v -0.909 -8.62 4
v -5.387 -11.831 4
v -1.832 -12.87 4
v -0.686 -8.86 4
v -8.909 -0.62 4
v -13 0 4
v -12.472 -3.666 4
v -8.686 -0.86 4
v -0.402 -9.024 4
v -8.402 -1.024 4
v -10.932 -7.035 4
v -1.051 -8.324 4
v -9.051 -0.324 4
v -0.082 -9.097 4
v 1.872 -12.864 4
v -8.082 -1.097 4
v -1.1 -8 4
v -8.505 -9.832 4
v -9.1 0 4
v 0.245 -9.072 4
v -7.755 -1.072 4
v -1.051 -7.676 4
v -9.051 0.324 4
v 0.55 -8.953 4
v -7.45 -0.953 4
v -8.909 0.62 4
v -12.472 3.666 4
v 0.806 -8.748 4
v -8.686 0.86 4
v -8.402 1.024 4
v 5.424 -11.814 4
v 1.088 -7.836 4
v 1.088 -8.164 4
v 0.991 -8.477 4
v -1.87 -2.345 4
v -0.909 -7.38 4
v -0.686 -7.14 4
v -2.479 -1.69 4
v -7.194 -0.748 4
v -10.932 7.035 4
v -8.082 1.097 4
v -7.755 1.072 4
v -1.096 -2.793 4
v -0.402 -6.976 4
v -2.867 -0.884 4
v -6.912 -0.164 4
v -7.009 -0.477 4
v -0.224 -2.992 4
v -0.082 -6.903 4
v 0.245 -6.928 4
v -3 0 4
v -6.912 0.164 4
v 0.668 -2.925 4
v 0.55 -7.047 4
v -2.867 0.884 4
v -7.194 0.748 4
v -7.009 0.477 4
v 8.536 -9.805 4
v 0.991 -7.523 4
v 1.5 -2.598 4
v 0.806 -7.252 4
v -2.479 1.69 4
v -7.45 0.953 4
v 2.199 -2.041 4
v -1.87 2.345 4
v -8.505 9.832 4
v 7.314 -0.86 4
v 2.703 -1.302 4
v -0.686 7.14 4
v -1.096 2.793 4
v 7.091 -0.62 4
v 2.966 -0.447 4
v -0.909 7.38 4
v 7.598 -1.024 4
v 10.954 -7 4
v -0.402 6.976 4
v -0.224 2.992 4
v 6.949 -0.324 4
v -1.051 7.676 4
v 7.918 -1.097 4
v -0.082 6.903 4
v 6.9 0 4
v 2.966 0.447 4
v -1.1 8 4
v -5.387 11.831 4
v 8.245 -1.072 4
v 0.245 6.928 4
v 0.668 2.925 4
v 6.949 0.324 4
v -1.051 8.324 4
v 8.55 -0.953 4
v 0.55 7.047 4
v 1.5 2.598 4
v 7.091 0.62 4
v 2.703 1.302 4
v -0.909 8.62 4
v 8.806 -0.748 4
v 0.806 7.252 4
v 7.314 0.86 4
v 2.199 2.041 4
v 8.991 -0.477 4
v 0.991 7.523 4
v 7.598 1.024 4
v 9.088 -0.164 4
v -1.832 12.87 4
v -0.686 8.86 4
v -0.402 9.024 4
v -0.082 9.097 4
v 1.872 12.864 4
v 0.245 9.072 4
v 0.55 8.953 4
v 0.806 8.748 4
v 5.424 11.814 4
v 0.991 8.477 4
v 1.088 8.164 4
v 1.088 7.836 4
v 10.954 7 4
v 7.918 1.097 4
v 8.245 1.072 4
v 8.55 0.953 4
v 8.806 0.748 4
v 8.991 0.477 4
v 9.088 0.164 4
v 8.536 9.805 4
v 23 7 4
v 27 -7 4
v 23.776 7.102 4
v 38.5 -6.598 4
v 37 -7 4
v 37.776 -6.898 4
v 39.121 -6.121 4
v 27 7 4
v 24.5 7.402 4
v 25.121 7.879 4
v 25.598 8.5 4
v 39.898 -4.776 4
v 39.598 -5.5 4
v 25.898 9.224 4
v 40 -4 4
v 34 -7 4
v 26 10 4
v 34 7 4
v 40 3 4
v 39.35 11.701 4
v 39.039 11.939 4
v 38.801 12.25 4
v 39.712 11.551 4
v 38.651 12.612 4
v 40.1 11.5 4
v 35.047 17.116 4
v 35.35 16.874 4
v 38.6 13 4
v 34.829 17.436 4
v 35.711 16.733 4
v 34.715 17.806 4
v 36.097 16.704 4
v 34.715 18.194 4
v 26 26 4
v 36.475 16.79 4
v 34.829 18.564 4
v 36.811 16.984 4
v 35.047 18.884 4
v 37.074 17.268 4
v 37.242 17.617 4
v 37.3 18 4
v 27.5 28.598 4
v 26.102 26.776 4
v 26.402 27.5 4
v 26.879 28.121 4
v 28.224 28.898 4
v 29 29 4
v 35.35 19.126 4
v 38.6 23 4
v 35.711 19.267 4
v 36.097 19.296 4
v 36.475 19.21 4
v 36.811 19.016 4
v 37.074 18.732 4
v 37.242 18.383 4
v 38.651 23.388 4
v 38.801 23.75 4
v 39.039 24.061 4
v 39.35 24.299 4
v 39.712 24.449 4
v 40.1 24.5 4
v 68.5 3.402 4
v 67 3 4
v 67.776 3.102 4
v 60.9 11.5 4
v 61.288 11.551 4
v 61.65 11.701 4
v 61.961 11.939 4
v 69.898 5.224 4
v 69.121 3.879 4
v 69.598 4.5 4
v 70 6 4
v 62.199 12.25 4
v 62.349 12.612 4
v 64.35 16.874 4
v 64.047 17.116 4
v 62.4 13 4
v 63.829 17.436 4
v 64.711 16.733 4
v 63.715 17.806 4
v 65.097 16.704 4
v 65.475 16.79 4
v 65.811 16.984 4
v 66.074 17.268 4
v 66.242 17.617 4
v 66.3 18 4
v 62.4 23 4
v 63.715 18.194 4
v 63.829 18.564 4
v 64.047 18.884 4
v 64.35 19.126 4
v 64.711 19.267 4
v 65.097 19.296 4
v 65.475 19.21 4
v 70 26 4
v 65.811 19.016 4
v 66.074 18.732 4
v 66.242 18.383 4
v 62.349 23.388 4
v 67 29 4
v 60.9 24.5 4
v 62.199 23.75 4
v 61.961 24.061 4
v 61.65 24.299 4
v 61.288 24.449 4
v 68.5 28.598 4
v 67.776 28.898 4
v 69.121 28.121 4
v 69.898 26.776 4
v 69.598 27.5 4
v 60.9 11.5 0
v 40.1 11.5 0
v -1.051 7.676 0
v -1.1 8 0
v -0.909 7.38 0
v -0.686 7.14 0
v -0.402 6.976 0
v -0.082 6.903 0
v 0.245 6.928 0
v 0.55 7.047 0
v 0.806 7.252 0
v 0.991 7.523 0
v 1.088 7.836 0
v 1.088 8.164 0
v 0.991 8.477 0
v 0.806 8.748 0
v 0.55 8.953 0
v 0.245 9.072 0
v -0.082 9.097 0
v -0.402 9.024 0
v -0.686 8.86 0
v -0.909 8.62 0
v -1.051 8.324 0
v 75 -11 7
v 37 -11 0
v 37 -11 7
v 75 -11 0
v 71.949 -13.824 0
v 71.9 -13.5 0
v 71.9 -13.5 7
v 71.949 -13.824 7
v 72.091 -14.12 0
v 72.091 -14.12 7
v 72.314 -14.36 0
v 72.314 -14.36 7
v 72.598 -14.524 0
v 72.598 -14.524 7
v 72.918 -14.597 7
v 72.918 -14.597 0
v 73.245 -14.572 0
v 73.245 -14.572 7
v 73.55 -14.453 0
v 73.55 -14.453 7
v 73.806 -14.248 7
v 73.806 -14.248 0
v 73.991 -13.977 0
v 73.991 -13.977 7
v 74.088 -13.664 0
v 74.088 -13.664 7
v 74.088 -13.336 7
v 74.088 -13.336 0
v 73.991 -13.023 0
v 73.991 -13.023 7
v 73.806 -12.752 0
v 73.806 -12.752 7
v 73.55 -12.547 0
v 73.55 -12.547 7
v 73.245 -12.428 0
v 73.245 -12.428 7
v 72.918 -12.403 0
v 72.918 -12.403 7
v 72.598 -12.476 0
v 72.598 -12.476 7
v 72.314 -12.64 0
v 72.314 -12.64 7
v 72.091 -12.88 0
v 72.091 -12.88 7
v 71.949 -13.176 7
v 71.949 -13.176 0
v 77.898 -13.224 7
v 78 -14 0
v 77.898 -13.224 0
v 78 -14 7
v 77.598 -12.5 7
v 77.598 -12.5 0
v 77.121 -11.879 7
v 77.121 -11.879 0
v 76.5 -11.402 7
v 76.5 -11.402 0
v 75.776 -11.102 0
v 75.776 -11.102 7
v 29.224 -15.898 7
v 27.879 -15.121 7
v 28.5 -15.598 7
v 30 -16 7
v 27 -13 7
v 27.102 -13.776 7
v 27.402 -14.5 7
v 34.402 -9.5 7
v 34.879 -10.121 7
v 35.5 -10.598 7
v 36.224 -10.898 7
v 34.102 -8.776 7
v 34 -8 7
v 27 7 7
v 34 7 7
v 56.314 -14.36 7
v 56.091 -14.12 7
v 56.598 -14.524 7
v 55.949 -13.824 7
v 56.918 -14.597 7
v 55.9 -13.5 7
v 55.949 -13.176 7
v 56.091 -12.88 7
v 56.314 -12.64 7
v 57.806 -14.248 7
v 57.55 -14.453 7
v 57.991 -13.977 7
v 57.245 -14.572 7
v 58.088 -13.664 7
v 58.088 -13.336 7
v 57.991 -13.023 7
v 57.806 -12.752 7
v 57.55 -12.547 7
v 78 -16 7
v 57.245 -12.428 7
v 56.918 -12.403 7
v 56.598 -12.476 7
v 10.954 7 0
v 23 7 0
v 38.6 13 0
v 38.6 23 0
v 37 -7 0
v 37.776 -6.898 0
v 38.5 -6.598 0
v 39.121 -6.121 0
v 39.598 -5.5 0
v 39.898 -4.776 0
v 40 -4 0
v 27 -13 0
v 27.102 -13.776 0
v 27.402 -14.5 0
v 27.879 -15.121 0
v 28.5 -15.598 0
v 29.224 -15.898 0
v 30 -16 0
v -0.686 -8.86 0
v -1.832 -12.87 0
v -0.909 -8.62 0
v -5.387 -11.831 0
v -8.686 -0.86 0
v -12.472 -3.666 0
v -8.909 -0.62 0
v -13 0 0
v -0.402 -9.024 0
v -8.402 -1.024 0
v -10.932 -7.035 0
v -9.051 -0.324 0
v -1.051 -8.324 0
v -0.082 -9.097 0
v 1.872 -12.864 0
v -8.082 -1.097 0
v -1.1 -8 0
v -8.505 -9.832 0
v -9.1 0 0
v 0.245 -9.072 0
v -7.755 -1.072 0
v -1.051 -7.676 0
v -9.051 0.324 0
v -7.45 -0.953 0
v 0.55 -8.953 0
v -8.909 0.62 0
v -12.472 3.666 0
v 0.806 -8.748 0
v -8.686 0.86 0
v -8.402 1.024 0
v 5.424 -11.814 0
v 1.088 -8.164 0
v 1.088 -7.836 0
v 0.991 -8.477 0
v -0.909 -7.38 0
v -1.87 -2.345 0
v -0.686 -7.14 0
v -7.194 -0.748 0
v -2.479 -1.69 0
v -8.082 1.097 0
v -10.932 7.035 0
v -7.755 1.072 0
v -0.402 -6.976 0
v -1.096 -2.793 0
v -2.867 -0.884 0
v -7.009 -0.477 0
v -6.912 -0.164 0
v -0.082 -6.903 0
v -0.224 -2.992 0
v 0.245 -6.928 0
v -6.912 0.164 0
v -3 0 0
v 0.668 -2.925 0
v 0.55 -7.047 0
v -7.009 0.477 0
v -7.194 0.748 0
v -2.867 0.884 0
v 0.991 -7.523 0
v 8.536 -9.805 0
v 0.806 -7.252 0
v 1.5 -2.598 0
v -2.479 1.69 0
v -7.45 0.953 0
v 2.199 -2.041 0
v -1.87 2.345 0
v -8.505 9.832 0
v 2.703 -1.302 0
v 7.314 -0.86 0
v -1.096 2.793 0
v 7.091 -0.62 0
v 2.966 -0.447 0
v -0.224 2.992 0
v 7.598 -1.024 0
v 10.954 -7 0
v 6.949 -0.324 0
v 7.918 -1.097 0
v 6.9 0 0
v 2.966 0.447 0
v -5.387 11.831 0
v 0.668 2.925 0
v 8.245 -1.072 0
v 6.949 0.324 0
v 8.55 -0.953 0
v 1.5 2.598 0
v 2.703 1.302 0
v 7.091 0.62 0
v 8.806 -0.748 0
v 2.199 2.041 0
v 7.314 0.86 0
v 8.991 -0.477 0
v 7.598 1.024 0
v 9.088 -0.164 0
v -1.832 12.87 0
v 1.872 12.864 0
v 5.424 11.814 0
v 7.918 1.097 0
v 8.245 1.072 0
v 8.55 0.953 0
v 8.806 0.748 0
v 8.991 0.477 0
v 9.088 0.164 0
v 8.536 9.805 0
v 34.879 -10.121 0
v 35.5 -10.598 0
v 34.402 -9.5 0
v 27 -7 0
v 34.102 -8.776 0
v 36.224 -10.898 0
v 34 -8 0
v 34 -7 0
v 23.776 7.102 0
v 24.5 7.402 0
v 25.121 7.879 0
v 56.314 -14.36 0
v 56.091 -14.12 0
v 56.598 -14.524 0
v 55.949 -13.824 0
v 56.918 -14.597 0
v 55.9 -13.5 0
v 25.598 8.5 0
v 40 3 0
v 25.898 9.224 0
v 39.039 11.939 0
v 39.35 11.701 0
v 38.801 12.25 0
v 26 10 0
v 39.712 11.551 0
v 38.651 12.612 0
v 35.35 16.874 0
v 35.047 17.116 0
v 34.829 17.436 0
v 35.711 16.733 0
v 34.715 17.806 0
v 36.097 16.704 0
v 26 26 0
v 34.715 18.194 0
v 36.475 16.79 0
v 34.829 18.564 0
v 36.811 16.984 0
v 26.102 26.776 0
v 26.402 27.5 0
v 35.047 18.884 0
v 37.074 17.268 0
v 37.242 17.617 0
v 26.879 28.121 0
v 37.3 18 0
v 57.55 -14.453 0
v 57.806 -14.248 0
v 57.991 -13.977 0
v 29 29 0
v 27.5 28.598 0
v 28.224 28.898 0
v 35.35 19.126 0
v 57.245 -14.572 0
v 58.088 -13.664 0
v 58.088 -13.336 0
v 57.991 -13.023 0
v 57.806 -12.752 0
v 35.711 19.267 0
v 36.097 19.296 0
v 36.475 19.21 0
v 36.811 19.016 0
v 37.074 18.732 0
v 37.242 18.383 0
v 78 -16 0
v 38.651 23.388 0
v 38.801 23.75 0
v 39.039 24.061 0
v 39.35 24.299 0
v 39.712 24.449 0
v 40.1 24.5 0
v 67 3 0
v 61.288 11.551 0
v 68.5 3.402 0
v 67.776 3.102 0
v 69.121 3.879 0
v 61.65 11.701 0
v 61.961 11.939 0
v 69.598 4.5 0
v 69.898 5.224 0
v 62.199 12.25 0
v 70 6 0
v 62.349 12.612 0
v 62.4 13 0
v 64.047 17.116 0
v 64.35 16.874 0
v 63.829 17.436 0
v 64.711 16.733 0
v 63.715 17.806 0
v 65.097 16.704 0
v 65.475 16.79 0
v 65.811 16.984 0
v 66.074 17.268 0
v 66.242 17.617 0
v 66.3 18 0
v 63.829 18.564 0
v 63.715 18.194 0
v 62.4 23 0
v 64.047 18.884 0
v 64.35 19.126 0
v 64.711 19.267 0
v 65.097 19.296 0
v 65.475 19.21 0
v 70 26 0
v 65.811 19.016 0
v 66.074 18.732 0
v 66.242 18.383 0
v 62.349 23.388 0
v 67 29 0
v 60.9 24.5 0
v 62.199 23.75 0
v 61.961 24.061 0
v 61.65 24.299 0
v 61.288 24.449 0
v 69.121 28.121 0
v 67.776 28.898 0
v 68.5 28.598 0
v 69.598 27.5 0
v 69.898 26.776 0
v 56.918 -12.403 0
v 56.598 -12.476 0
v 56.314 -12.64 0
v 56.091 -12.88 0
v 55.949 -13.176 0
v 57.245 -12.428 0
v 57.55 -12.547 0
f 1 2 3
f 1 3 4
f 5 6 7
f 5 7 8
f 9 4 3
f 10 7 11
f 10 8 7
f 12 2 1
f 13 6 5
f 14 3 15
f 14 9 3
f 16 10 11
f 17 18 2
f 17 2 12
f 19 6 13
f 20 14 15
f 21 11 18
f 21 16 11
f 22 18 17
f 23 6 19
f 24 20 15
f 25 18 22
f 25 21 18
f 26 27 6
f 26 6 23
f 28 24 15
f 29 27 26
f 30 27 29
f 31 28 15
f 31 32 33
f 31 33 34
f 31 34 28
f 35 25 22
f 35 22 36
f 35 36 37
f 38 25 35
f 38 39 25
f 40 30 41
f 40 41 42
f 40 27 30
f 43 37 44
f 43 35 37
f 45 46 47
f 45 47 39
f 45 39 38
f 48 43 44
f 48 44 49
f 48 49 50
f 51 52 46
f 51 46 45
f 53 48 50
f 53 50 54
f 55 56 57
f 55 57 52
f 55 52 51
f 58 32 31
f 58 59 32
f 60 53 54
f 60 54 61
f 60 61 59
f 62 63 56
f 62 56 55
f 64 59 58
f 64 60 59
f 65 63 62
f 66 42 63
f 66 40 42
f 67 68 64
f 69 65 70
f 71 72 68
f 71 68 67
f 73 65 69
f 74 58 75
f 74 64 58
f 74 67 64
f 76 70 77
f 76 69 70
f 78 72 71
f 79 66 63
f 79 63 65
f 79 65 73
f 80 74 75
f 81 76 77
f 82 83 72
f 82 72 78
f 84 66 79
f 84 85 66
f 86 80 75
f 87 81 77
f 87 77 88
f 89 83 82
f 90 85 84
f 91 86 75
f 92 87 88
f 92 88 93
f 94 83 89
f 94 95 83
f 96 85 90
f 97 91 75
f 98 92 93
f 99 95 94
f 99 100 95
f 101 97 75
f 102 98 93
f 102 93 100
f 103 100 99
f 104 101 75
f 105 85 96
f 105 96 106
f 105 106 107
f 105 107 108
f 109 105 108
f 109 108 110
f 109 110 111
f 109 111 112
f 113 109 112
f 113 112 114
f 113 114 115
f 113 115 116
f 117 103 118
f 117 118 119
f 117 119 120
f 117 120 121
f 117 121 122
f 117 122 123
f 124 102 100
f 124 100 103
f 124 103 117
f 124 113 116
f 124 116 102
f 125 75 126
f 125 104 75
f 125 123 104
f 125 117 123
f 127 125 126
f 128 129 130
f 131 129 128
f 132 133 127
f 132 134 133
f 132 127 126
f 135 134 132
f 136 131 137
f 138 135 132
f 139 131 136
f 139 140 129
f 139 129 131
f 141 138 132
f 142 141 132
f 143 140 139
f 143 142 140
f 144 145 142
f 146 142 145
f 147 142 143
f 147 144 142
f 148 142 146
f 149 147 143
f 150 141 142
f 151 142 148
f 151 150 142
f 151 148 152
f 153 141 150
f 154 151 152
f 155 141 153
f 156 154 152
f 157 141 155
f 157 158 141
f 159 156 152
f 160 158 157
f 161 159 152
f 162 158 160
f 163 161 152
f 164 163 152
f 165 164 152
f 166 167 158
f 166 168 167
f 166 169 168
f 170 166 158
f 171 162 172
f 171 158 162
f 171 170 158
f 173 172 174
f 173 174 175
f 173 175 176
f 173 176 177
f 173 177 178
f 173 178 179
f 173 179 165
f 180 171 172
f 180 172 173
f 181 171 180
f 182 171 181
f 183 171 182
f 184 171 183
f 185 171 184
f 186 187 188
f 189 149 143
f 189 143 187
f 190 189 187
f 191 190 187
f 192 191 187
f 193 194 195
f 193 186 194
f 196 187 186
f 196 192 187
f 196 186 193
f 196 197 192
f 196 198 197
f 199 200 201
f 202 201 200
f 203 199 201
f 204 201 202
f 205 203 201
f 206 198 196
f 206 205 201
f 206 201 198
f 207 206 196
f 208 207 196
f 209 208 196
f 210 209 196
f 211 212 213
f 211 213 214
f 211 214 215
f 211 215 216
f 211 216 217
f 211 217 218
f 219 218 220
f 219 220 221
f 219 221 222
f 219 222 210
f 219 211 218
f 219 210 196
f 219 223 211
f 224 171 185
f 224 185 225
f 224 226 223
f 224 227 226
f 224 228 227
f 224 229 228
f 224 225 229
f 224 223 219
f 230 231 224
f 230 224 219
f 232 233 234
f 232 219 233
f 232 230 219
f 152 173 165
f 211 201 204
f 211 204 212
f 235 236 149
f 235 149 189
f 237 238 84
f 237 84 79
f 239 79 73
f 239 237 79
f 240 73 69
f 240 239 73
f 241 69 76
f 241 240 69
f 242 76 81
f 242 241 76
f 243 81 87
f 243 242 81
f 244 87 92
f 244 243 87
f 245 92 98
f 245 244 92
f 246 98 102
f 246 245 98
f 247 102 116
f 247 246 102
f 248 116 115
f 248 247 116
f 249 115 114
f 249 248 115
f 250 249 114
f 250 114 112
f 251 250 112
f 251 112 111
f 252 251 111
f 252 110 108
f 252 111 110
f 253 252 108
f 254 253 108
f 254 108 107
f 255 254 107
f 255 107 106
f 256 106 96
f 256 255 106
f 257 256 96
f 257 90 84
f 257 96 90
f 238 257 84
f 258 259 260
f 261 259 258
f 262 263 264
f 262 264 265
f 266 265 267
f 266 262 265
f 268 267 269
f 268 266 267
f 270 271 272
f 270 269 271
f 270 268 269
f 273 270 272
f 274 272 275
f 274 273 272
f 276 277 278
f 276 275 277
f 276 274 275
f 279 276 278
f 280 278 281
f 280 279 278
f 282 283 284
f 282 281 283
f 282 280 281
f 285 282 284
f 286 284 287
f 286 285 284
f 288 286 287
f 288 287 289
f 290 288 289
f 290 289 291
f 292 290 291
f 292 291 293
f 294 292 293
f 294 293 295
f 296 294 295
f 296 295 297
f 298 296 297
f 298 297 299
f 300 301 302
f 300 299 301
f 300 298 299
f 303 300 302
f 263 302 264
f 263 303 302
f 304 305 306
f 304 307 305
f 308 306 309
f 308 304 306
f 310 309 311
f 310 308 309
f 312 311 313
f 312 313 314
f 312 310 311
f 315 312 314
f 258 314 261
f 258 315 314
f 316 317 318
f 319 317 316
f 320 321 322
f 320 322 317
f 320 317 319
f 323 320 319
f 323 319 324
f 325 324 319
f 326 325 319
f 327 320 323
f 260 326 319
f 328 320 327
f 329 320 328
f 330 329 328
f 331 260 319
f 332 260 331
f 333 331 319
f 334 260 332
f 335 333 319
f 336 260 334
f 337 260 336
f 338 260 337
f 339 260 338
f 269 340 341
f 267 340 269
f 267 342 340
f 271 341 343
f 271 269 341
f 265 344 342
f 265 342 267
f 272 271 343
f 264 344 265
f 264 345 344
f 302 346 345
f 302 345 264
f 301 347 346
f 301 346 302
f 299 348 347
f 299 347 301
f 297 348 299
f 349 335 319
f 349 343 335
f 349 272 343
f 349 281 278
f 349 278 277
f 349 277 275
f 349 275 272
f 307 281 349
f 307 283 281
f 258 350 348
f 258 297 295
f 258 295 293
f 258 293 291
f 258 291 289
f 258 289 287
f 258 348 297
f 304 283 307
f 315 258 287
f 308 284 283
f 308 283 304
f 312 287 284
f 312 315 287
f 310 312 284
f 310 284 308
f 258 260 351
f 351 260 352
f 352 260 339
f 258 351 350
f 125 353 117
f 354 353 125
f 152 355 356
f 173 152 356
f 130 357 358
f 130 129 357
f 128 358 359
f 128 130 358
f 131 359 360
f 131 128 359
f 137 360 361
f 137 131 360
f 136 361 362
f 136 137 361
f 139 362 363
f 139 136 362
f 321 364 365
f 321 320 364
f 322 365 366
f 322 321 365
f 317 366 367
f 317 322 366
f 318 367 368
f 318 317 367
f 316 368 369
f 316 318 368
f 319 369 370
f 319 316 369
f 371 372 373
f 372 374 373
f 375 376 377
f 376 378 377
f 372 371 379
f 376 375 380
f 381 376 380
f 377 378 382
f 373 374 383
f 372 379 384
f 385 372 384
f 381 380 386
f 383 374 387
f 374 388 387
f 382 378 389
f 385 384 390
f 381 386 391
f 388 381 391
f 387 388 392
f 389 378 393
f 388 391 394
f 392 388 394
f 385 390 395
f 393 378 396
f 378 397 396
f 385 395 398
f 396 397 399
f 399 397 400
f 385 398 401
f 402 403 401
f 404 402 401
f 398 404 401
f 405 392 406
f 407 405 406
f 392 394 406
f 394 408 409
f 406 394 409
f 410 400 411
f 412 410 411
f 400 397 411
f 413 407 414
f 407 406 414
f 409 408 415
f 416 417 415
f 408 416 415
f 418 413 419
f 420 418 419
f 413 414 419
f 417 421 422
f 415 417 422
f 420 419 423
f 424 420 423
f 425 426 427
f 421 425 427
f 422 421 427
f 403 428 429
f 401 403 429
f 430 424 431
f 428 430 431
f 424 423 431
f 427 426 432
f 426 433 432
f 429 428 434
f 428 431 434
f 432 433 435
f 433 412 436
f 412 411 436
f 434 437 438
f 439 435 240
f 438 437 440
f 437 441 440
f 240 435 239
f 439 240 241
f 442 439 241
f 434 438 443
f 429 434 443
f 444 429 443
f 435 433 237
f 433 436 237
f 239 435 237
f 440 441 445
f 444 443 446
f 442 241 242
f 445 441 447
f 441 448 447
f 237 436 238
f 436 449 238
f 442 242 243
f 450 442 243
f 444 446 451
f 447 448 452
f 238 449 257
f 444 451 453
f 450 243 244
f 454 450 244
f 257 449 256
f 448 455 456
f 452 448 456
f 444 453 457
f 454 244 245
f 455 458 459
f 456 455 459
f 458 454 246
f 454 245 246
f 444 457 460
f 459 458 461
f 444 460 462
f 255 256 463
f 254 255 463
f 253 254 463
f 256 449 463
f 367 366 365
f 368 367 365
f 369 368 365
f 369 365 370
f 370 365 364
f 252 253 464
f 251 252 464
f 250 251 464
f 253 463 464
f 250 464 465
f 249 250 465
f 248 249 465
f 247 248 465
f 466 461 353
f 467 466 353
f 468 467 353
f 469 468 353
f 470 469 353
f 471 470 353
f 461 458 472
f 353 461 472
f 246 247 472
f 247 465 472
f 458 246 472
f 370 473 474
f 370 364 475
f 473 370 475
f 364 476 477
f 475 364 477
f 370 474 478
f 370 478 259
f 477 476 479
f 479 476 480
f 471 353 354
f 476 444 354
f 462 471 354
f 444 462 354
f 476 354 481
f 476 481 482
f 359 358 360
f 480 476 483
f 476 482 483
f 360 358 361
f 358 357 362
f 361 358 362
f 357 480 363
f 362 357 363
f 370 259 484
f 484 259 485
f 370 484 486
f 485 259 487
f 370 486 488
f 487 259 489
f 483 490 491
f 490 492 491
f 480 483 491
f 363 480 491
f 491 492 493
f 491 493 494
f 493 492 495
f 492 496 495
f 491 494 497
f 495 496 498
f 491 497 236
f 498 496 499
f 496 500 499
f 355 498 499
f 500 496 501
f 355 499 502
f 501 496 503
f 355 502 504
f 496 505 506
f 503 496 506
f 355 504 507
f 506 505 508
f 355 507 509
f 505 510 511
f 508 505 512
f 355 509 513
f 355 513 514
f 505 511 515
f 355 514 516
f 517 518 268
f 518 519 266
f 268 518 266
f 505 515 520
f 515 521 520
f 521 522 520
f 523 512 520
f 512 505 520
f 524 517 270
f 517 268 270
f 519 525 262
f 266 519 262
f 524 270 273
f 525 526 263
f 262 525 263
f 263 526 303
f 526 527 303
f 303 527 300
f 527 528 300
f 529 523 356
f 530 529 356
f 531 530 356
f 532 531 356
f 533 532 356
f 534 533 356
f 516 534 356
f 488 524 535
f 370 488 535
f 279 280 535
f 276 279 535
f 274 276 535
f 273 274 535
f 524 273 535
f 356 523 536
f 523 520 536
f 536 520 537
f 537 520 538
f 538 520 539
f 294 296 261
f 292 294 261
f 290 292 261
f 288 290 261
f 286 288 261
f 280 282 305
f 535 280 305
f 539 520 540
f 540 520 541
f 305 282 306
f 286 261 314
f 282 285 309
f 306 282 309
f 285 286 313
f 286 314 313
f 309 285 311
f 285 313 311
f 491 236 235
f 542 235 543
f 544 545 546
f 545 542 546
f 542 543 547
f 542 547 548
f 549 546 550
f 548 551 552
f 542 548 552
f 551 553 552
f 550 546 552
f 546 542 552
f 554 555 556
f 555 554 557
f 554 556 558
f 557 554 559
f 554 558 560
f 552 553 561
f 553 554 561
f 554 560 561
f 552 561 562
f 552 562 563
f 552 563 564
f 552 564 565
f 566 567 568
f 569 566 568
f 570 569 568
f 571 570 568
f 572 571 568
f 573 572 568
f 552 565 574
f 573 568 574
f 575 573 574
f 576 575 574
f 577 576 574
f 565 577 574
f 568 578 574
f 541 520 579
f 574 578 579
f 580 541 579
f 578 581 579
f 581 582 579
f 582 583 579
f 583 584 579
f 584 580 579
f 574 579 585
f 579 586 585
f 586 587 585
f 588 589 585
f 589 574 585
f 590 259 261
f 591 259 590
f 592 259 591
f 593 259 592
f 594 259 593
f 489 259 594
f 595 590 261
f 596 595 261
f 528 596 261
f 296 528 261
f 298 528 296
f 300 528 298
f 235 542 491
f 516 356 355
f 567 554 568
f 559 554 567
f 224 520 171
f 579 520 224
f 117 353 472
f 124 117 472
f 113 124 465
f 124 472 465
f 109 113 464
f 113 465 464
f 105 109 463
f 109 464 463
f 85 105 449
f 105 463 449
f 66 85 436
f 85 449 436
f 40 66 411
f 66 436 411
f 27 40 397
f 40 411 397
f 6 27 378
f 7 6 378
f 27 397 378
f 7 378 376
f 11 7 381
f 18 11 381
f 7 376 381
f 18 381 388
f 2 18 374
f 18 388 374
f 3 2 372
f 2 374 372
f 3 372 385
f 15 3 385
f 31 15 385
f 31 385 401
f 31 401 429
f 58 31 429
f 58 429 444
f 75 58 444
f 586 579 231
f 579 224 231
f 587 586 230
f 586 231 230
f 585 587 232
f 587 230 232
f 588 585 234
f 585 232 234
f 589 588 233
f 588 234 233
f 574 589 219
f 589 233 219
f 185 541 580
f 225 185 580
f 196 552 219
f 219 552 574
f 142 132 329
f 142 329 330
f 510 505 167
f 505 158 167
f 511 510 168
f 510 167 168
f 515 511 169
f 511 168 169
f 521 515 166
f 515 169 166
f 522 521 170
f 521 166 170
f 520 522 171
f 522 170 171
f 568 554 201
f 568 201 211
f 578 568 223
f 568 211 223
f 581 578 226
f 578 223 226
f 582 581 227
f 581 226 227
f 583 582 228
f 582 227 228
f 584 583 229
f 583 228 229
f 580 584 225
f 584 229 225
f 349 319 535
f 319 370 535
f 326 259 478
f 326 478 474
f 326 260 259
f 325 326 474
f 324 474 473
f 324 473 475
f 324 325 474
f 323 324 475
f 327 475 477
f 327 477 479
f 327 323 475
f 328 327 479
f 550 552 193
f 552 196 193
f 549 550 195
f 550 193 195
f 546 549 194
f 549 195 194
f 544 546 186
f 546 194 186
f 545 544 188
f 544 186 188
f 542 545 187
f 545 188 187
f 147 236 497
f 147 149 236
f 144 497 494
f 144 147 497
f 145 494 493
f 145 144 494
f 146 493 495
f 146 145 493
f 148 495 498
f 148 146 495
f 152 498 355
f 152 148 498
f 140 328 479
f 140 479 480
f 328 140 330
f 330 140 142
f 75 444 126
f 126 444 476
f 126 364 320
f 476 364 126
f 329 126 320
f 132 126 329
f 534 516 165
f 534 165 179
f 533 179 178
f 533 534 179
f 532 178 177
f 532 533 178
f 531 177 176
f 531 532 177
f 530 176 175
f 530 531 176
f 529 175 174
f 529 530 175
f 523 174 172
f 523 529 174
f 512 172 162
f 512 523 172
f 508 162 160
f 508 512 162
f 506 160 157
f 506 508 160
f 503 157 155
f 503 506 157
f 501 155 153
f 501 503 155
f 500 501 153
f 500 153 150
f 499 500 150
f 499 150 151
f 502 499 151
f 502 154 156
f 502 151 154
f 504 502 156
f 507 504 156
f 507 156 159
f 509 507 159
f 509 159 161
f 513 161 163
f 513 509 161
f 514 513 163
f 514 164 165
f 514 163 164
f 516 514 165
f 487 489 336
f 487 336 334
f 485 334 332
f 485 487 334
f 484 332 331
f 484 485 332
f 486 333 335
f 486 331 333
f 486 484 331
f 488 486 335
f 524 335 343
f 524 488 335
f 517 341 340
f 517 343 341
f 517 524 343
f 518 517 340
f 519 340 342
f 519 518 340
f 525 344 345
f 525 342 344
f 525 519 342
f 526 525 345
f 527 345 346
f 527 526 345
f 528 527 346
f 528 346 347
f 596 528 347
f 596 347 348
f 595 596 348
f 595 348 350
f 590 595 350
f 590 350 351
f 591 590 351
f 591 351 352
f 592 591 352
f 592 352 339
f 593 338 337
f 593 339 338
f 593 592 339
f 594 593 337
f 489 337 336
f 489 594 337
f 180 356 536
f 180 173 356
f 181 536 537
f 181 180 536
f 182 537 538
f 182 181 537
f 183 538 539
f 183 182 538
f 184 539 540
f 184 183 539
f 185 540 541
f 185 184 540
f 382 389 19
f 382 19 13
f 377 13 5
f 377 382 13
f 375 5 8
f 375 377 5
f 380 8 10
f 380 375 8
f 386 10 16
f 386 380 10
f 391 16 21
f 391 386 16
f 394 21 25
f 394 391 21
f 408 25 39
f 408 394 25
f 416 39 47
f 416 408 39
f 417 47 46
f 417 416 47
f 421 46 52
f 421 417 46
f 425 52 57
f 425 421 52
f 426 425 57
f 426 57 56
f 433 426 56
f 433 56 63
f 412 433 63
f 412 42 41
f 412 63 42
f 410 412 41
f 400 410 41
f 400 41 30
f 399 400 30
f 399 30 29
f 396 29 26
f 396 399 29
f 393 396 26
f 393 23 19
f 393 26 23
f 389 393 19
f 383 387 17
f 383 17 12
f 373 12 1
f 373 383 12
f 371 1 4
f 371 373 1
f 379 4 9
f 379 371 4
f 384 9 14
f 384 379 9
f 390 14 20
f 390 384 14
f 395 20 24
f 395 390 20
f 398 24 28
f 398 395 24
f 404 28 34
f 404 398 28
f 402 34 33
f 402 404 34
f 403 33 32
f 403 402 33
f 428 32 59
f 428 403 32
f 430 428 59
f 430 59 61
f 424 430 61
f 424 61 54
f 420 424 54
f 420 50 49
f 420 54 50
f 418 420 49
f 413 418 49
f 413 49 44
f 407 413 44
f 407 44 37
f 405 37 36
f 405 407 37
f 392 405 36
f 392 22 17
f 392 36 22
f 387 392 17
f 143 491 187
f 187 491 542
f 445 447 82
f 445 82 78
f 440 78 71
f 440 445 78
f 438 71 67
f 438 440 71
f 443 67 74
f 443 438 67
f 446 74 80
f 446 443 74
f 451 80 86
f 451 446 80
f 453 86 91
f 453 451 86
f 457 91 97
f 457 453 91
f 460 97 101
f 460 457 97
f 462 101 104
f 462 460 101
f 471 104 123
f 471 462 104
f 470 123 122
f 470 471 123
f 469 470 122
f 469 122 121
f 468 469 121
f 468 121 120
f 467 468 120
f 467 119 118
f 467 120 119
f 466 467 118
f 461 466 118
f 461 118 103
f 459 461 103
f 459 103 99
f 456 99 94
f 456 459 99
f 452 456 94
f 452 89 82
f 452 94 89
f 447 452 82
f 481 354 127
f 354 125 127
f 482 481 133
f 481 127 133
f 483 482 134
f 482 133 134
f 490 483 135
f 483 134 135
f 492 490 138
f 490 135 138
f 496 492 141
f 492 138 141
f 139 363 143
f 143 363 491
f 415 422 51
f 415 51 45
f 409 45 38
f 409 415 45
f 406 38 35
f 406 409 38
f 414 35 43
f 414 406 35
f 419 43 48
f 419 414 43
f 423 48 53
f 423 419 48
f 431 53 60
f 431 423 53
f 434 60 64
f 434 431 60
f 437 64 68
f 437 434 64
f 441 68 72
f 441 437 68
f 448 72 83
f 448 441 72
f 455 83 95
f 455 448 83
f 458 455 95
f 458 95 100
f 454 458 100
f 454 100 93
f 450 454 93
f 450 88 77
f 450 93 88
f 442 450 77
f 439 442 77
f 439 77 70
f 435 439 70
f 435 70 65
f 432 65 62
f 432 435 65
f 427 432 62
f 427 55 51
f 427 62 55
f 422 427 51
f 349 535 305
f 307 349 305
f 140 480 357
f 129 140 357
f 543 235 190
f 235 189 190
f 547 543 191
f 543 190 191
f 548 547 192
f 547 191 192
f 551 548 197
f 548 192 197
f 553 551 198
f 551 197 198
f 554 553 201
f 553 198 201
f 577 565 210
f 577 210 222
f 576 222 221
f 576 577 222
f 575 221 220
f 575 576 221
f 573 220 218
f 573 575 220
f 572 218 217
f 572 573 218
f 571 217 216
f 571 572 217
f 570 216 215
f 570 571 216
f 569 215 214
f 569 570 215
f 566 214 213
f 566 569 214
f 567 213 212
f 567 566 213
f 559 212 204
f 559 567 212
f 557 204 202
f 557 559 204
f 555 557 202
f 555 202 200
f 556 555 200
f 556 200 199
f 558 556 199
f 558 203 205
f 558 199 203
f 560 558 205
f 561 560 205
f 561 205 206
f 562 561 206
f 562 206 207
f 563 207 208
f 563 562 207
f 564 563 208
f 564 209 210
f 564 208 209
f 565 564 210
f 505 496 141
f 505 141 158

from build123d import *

# Parameters (mm, degrees)
ELBOW_HORN_FLANGE_PROFILE_R          = 13
ELBOW_HORN_FLANGE_DEPTH              = 4
FOREARM_WEB_PROFILE_W                = 40
FOREARM_WEB_PROFILE_H                = 14
FOREARM_WEB_DEPTH                    = 4
GRIPPER_SERVO_MOUNT_PROFILE_W        = 44
GRIPPER_SERVO_MOUNT_PROFILE_H        = 26
GRIPPER_SERVO_MOUNT_DEPTH            = 4
GRIP_SG90_BODY_CLEARANCE_START       = -5
GRIP_SG90_BODY_CLEARANCE_PROFILE_W   = 23.8
GRIP_SG90_BODY_CLEARANCE_PROFILE_H   = 13
GRIP_SG90_BODY_CLEARANCE_DEPTH       = 81.874897035
GRIP_SERVO_TAB_FASTENERS_START       = -50
GRIP_SERVO_TAB_FASTENERS_PROFILE_R   = 1.3
GRIP_SERVO_TAB_FASTENERS_DEPTH       = 126.874897035
FIXED_FINGER_SPINE_PROFILE_W         = 48
FIXED_FINGER_SPINE_PROFILE_H         = 5
FIXED_FINGER_SPINE_DEPTH             = 7
FIXED_FINGER_ROOT_PROFILE_W          = 7
FIXED_FINGER_ROOT_PROFILE_H          = 23
FIXED_FINGER_ROOT_DEPTH              = 7
ELBOW_CENTER_SCREW_ACCESS_START      = -50
ELBOW_CENTER_SCREW_ACCESS_PROFILE_R  = 3
ELBOW_CENTER_SCREW_ACCESS_DEPTH      = 134.510478384
ELBOW_HORN_FASTENERS_START           = -50
ELBOW_HORN_FASTENERS_PROFILE_R       = 1.1
ELBOW_HORN_FASTENERS_DEPTH           = 134.510478384
FIXED_PAD_KEEPER_FASTENERS_START     = -50
FIXED_PAD_KEEPER_FASTENERS_PROFILE_R = 1.1
FIXED_PAD_KEEPER_FASTENERS_DEPTH     = 134.510478384
FILLET1_R                            = 3
FILLET2_R                            = 1.5


with BuildPart() as part:
    # Elbow_horn_flange_profile → Elbow_horn_flange (new body)
    with BuildSketch(Plane.XY):
        Circle(ELBOW_HORN_FLANGE_PROFILE_R)
    extrude(amount=ELBOW_HORN_FLANGE_DEPTH)

    # Forearm_web_profile → Forearm_web (add)
    with BuildSketch(Plane.XY):
        with Locations((20, 0)):
            Rectangle(FOREARM_WEB_PROFILE_W, FOREARM_WEB_PROFILE_H)
    extrude(amount=FOREARM_WEB_DEPTH)

    # Gripper_servo_mount_profile → Gripper_servo_mount (add)
    with BuildSketch(Plane.XY):
        with Locations((48, 16)):
            Rectangle(GRIPPER_SERVO_MOUNT_PROFILE_W, GRIPPER_SERVO_MOUNT_PROFILE_H)
    extrude(amount=GRIPPER_SERVO_MOUNT_DEPTH)

    # Grip_SG90_body_clearance_profile → Grip_SG90_body_clearance (cut, through all)
    with BuildSketch(Plane.XY.offset(GRIP_SG90_BODY_CLEARANCE_START)):
        with Locations((50.5, 18)):
            Rectangle(GRIP_SG90_BODY_CLEARANCE_PROFILE_W, GRIP_SG90_BODY_CLEARANCE_PROFILE_H)
    extrude(amount=GRIP_SG90_BODY_CLEARANCE_DEPTH, mode=Mode.SUBTRACT)

    # Grip_servo_tab_fasteners_profile → Grip_servo_tab_fasteners (cut, through all)
    with BuildSketch(Plane.XY.offset(GRIP_SERVO_TAB_FASTENERS_START)):
        with Locations((36, 18)):
            Circle(GRIP_SERVO_TAB_FASTENERS_PROFILE_R)
        with Locations((65, 18)):
            Circle(GRIP_SERVO_TAB_FASTENERS_PROFILE_R)
    extrude(amount=GRIP_SERVO_TAB_FASTENERS_DEPTH, mode=Mode.SUBTRACT)



with BuildPart() as body_2:
    # Fixed_finger_spine_profile → Fixed_finger_spine (new body)
    with BuildSketch(Plane.XY):
        with Locations((54, -13.5)):
            Rectangle(FIXED_FINGER_SPINE_PROFILE_W, FIXED_FINGER_SPINE_PROFILE_H)
    extrude(amount=FIXED_FINGER_SPINE_DEPTH)


with BuildPart() as part_1:
    add(part.part)

    add(body_2.part)  # Fixed_finger_root merges body 2
    # Fixed_finger_root_profile → Fixed_finger_root (add)
    with BuildSketch(Plane.XY):
        with Locations((30.5, -4.5)):
            Rectangle(FIXED_FINGER_ROOT_PROFILE_W, FIXED_FINGER_ROOT_PROFILE_H)
    extrude(amount=FIXED_FINGER_ROOT_DEPTH)

    # Elbow_center_screw_access_profile → Elbow_center_screw_access (cut, through all)
    with BuildSketch(Plane.XY.offset(ELBOW_CENTER_SCREW_ACCESS_START)):
        with Locations(Location((0, 0, 0), (0, 0, 180))):
            Circle(ELBOW_CENTER_SCREW_ACCESS_PROFILE_R)
    extrude(amount=ELBOW_CENTER_SCREW_ACCESS_DEPTH, mode=Mode.SUBTRACT)

    # Elbow_horn_fasteners_profile → Elbow_horn_fasteners (cut, through all)
    with BuildSketch(Plane.XY.offset(ELBOW_HORN_FASTENERS_START)):
        with Locations(Location((0, -8, 0), (0, 0, 180))):
            Circle(ELBOW_HORN_FASTENERS_PROFILE_R)
        with Locations(Location((0, 8, 0), (0, 0, 180))):
            Circle(ELBOW_HORN_FASTENERS_PROFILE_R)
        with Locations(Location((-8, 0, 0), (0, 0, 180))):
            Circle(ELBOW_HORN_FASTENERS_PROFILE_R)
        with Locations(Location((8, 0, 0), (0, 0, 180))):
            Circle(ELBOW_HORN_FASTENERS_PROFILE_R)
    extrude(amount=ELBOW_HORN_FASTENERS_DEPTH, mode=Mode.SUBTRACT)

    # Fixed_pad_keeper_fasteners_profile → Fixed_pad_keeper_fasteners (cut, through all)
    with BuildSketch(Plane.XY.offset(FIXED_PAD_KEEPER_FASTENERS_START)):
        with Locations(Location((57, -13.5, 0), (0, 0, 180))):
            Circle(FIXED_PAD_KEEPER_FASTENERS_PROFILE_R)
        with Locations(Location((73, -13.5, 0), (0, 0, 180))):
            Circle(FIXED_PAD_KEEPER_FASTENERS_PROFILE_R)
    extrude(amount=FIXED_PAD_KEEPER_FASTENERS_DEPTH, mode=Mode.SUBTRACT)

    # Fillet1
    fillet1_edges = [part_1.edges().sort_by_distance(p)[0] for p in [
        (34, -11, 3.5),
        (78, -11, 3.5),
        (40, -7, 2),
        (26, 7, 2),
        (26, 29, 2),
        (70, 3, 2),
        (70, 29, 2),
        (27, -16, 3.5),
    ]]
    fillet(fillet1_edges, radius=FILLET1_R)

    # Fillet2
    fillet2_edges = [part_1.edges().sort_by_distance(p)[0] for p in [
        (38.6, 24.5, 2),
        (38.6, 11.5, 2),
        (62.4, 11.5, 2),
        (62.4, 24.5, 2),
    ]]
    fillet(fillet2_edges, radius=FILLET2_R)


solid = part_1.part
